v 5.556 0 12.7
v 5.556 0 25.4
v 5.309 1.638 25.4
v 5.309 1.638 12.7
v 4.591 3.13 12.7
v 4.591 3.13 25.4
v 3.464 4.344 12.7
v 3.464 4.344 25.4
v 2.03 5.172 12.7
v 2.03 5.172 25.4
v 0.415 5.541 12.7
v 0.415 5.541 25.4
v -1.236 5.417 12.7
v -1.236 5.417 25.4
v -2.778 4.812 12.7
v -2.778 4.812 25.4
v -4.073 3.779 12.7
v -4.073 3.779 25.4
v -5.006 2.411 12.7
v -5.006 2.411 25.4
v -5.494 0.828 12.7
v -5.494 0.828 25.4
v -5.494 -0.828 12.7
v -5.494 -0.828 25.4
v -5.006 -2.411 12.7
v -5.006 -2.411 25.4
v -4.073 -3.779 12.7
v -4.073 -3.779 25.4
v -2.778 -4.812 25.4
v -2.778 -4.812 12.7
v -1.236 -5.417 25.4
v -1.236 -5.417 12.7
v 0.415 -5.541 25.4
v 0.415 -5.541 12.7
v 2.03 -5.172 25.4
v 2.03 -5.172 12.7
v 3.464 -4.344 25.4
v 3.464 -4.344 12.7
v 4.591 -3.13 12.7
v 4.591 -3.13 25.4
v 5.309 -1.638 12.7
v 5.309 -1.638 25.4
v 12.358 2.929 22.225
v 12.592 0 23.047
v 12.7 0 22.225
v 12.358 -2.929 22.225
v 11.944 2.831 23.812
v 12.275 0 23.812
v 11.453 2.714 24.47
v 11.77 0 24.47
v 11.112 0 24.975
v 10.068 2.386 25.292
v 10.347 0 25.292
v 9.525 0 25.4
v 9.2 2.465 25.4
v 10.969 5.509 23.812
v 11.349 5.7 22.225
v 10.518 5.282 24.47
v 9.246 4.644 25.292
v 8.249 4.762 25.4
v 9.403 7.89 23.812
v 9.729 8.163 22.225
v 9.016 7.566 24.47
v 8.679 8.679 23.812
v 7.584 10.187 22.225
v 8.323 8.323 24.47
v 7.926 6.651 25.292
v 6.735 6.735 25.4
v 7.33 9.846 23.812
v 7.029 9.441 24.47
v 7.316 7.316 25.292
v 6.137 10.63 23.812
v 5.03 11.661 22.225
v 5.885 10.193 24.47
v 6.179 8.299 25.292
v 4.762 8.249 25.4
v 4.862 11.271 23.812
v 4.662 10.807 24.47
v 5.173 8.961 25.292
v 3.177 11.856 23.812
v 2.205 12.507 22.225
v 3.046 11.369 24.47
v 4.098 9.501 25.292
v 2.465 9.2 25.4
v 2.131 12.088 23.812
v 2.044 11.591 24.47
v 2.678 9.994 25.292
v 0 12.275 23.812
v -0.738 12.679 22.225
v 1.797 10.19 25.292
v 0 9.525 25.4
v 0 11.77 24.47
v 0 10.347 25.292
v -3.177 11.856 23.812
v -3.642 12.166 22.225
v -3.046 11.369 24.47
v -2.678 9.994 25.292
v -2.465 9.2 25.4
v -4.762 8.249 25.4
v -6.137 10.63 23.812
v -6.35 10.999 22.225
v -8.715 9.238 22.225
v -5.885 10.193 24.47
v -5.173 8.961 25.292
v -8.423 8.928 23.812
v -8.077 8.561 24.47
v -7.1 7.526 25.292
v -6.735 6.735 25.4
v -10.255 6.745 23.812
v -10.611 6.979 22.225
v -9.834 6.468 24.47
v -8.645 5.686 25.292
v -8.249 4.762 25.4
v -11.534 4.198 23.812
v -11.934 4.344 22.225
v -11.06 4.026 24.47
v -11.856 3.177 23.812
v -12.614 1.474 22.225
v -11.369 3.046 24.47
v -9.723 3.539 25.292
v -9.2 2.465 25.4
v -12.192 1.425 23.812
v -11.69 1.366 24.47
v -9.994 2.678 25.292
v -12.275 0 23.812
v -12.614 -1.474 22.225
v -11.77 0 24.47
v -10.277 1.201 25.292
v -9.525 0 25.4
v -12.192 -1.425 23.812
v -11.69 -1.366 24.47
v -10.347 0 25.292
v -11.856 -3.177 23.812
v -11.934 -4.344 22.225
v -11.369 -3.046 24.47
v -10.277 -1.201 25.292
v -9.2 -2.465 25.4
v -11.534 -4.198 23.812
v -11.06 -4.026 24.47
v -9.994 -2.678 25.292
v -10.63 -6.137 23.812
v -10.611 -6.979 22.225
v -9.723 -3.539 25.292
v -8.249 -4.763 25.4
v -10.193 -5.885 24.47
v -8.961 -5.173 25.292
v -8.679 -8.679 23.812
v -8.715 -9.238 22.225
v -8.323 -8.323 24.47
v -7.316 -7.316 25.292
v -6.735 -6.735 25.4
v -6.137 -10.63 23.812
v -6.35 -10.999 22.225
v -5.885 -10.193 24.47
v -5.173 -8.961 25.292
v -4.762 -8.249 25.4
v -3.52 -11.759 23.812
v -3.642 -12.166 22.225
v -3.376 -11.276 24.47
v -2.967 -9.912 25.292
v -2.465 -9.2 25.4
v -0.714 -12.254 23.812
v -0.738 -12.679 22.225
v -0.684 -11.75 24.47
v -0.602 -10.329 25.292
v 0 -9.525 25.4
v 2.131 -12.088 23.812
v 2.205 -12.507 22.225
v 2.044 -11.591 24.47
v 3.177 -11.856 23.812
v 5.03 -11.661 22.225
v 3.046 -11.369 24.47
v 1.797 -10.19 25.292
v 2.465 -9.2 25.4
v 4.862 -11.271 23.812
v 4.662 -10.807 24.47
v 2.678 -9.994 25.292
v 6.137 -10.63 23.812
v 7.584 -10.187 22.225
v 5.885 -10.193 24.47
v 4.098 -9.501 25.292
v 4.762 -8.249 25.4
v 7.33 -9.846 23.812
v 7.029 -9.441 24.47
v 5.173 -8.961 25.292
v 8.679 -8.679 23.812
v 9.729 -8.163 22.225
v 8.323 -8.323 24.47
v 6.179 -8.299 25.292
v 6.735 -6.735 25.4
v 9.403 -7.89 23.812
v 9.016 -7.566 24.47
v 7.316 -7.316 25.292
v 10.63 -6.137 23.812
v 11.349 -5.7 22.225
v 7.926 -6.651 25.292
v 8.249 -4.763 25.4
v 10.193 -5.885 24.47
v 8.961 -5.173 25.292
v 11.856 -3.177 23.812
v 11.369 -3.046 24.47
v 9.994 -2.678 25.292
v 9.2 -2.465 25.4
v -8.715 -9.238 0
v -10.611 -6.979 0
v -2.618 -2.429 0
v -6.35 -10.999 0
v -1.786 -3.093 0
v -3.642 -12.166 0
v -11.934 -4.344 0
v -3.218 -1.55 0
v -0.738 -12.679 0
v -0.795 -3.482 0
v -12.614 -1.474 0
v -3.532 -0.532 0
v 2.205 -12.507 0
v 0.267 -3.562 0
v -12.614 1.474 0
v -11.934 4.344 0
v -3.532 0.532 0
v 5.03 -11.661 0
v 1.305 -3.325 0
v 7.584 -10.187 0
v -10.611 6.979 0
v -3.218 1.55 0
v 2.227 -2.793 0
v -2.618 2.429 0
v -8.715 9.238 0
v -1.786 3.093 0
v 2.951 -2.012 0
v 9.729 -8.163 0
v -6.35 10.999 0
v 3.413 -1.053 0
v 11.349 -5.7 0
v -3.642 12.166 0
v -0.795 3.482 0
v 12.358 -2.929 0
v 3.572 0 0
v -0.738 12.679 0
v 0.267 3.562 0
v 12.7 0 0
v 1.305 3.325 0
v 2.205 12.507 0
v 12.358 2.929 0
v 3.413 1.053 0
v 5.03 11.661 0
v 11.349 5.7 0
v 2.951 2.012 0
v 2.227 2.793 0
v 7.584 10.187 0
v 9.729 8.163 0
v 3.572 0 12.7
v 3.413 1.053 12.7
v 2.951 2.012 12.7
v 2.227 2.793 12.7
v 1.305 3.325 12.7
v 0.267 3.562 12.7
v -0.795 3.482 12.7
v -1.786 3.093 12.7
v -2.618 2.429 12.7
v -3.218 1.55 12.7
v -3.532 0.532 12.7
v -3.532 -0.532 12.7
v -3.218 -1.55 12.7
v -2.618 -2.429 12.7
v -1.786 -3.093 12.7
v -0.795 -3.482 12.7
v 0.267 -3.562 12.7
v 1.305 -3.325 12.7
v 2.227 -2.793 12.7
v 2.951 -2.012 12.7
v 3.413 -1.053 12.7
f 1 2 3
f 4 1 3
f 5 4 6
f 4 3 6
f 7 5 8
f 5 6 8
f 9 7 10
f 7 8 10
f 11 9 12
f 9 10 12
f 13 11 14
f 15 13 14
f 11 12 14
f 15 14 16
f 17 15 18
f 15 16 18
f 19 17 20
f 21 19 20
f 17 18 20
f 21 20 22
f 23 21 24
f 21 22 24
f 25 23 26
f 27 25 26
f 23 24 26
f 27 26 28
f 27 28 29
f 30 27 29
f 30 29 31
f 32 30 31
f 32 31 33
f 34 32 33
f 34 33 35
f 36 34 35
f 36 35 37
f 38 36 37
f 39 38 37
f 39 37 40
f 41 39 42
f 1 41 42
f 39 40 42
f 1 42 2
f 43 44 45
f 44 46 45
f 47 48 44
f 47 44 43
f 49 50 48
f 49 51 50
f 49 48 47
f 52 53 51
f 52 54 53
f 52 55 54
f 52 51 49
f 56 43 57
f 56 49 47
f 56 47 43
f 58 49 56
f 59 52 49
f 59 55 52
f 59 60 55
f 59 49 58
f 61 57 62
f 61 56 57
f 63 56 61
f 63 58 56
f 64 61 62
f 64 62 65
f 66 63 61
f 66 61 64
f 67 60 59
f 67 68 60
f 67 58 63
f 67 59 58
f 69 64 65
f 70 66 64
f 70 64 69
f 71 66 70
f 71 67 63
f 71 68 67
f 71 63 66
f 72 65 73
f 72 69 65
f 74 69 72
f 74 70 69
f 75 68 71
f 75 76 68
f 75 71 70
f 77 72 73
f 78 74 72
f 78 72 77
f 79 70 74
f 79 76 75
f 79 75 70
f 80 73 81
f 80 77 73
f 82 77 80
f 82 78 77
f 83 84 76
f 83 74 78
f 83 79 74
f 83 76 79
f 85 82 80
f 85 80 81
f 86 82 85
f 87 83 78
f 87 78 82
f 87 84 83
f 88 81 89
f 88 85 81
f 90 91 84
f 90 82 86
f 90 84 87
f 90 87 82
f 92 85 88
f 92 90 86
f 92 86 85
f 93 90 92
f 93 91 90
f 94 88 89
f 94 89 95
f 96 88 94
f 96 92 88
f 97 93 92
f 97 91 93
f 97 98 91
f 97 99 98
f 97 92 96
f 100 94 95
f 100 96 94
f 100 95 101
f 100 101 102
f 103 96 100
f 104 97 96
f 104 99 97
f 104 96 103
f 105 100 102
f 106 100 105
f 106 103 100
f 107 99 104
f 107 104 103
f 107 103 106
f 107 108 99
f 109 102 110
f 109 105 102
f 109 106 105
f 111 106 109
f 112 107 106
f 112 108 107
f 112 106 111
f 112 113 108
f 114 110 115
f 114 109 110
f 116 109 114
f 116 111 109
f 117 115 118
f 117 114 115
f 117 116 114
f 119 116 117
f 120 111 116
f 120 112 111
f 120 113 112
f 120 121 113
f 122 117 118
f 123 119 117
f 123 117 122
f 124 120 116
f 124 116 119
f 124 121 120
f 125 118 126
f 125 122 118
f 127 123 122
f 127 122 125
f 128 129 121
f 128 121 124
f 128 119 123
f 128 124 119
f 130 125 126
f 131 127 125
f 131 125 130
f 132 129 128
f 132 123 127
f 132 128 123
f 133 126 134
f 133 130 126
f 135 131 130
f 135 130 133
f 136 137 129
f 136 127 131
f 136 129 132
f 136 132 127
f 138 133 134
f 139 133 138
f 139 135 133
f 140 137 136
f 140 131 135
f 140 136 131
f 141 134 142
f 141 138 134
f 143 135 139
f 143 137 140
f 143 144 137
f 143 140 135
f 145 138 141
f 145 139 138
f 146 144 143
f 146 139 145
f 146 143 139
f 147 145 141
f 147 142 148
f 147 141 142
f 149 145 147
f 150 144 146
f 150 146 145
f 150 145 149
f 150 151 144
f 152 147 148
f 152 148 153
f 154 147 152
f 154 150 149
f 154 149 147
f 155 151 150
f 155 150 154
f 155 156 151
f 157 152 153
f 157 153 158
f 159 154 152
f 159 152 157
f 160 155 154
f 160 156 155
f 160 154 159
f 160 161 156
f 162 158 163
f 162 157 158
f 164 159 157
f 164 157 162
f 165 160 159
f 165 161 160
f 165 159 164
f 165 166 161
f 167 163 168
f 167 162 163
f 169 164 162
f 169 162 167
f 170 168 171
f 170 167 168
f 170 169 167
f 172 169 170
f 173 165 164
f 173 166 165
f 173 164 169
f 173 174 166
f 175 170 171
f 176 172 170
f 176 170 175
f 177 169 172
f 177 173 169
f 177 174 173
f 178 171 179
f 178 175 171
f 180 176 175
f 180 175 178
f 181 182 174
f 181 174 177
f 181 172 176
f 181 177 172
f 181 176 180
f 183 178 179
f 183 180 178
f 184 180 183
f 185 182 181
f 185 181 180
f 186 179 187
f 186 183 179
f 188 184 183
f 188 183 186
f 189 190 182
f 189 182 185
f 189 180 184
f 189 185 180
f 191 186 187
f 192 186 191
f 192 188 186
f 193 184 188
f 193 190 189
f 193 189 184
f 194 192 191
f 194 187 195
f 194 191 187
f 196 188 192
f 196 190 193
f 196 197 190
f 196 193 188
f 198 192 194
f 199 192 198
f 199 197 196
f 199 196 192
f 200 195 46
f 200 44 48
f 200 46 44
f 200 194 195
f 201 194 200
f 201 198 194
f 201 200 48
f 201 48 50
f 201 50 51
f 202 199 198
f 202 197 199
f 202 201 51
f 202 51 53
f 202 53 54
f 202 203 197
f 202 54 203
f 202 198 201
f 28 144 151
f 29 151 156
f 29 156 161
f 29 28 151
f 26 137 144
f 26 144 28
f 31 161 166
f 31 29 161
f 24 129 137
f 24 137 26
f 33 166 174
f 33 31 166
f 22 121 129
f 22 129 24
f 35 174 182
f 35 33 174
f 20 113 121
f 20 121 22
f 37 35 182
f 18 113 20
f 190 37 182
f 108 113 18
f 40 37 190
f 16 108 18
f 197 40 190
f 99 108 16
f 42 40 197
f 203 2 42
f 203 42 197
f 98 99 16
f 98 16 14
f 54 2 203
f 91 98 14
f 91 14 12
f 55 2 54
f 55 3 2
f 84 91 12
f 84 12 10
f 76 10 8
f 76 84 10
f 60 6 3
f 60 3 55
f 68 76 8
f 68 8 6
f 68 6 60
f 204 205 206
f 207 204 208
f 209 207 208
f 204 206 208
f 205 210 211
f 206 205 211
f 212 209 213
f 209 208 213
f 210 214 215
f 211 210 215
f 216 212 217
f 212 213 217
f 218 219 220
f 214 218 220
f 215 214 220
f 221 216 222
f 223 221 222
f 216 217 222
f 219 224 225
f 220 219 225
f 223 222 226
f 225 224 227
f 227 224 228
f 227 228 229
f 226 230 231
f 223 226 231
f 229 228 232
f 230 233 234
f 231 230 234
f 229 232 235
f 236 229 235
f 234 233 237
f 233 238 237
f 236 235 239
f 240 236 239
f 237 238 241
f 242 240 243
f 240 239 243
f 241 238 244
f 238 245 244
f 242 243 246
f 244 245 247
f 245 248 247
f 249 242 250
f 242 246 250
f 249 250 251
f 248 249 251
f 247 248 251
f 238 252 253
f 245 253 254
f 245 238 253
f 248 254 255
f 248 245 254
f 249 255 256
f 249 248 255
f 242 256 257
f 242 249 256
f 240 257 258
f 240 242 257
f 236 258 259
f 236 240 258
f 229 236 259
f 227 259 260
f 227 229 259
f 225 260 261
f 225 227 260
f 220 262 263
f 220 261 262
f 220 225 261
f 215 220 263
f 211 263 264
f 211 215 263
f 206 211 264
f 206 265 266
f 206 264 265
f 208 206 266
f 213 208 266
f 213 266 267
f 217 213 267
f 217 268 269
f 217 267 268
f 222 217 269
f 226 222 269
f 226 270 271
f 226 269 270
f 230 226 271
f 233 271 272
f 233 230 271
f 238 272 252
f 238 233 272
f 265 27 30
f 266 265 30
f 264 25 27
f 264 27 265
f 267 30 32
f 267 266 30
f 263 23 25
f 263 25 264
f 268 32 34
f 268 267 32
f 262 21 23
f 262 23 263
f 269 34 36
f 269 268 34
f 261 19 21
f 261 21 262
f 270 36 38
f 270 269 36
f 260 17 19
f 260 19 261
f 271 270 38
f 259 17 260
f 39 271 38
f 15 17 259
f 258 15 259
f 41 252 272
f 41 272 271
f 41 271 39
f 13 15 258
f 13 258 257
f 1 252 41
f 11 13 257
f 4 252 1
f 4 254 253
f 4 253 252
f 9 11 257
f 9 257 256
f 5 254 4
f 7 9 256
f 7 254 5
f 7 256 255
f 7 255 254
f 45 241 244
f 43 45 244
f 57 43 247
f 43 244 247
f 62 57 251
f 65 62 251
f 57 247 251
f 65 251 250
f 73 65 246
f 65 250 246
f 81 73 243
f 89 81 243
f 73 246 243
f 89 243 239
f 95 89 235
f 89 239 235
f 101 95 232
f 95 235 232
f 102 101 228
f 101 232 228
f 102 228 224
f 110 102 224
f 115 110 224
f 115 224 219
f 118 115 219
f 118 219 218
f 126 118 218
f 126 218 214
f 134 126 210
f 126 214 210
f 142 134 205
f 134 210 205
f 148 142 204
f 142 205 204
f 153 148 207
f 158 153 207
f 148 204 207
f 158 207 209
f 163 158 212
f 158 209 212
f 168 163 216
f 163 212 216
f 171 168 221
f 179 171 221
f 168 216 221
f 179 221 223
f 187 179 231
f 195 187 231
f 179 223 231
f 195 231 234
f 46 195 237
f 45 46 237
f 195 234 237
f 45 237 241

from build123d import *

# Parameters (mm, degrees)
SKETCH1_R           = 12.7
SKETCH1_R_2         = 3.571875
BOSS_EXTRUDE1_DEPTH = 25.4
SKETCH2_R           = 5.55625
CUT_EXTRUDE1_DEPTH  = 12.7
FILLET1_R           = 3.175


with BuildPart() as part:
    # Sketch1 → Boss-Extrude1 (new body)
    with BuildSketch(Plane.XY):
        Circle(SKETCH1_R)
        Circle(SKETCH1_R_2, mode=Mode.SUBTRACT)
    extrude(amount=BOSS_EXTRUDE1_DEPTH)

    # Sketch2 → Cut-Extrude1 (cut)
    with BuildSketch(Plane.XY.offset(25.4)):
        Circle(SKETCH2_R)
    extrude(amount=-CUT_EXTRUDE1_DEPTH, mode=Mode.SUBTRACT)

    # Fillet1
    fillet1_edges = [part.edges().sort_by_distance(p)[0] for p in [
        (-12.7, 0, 25.4),
    ]]
    fillet(fillet1_edges, radius=FILLET1_R)


solid = part.part
